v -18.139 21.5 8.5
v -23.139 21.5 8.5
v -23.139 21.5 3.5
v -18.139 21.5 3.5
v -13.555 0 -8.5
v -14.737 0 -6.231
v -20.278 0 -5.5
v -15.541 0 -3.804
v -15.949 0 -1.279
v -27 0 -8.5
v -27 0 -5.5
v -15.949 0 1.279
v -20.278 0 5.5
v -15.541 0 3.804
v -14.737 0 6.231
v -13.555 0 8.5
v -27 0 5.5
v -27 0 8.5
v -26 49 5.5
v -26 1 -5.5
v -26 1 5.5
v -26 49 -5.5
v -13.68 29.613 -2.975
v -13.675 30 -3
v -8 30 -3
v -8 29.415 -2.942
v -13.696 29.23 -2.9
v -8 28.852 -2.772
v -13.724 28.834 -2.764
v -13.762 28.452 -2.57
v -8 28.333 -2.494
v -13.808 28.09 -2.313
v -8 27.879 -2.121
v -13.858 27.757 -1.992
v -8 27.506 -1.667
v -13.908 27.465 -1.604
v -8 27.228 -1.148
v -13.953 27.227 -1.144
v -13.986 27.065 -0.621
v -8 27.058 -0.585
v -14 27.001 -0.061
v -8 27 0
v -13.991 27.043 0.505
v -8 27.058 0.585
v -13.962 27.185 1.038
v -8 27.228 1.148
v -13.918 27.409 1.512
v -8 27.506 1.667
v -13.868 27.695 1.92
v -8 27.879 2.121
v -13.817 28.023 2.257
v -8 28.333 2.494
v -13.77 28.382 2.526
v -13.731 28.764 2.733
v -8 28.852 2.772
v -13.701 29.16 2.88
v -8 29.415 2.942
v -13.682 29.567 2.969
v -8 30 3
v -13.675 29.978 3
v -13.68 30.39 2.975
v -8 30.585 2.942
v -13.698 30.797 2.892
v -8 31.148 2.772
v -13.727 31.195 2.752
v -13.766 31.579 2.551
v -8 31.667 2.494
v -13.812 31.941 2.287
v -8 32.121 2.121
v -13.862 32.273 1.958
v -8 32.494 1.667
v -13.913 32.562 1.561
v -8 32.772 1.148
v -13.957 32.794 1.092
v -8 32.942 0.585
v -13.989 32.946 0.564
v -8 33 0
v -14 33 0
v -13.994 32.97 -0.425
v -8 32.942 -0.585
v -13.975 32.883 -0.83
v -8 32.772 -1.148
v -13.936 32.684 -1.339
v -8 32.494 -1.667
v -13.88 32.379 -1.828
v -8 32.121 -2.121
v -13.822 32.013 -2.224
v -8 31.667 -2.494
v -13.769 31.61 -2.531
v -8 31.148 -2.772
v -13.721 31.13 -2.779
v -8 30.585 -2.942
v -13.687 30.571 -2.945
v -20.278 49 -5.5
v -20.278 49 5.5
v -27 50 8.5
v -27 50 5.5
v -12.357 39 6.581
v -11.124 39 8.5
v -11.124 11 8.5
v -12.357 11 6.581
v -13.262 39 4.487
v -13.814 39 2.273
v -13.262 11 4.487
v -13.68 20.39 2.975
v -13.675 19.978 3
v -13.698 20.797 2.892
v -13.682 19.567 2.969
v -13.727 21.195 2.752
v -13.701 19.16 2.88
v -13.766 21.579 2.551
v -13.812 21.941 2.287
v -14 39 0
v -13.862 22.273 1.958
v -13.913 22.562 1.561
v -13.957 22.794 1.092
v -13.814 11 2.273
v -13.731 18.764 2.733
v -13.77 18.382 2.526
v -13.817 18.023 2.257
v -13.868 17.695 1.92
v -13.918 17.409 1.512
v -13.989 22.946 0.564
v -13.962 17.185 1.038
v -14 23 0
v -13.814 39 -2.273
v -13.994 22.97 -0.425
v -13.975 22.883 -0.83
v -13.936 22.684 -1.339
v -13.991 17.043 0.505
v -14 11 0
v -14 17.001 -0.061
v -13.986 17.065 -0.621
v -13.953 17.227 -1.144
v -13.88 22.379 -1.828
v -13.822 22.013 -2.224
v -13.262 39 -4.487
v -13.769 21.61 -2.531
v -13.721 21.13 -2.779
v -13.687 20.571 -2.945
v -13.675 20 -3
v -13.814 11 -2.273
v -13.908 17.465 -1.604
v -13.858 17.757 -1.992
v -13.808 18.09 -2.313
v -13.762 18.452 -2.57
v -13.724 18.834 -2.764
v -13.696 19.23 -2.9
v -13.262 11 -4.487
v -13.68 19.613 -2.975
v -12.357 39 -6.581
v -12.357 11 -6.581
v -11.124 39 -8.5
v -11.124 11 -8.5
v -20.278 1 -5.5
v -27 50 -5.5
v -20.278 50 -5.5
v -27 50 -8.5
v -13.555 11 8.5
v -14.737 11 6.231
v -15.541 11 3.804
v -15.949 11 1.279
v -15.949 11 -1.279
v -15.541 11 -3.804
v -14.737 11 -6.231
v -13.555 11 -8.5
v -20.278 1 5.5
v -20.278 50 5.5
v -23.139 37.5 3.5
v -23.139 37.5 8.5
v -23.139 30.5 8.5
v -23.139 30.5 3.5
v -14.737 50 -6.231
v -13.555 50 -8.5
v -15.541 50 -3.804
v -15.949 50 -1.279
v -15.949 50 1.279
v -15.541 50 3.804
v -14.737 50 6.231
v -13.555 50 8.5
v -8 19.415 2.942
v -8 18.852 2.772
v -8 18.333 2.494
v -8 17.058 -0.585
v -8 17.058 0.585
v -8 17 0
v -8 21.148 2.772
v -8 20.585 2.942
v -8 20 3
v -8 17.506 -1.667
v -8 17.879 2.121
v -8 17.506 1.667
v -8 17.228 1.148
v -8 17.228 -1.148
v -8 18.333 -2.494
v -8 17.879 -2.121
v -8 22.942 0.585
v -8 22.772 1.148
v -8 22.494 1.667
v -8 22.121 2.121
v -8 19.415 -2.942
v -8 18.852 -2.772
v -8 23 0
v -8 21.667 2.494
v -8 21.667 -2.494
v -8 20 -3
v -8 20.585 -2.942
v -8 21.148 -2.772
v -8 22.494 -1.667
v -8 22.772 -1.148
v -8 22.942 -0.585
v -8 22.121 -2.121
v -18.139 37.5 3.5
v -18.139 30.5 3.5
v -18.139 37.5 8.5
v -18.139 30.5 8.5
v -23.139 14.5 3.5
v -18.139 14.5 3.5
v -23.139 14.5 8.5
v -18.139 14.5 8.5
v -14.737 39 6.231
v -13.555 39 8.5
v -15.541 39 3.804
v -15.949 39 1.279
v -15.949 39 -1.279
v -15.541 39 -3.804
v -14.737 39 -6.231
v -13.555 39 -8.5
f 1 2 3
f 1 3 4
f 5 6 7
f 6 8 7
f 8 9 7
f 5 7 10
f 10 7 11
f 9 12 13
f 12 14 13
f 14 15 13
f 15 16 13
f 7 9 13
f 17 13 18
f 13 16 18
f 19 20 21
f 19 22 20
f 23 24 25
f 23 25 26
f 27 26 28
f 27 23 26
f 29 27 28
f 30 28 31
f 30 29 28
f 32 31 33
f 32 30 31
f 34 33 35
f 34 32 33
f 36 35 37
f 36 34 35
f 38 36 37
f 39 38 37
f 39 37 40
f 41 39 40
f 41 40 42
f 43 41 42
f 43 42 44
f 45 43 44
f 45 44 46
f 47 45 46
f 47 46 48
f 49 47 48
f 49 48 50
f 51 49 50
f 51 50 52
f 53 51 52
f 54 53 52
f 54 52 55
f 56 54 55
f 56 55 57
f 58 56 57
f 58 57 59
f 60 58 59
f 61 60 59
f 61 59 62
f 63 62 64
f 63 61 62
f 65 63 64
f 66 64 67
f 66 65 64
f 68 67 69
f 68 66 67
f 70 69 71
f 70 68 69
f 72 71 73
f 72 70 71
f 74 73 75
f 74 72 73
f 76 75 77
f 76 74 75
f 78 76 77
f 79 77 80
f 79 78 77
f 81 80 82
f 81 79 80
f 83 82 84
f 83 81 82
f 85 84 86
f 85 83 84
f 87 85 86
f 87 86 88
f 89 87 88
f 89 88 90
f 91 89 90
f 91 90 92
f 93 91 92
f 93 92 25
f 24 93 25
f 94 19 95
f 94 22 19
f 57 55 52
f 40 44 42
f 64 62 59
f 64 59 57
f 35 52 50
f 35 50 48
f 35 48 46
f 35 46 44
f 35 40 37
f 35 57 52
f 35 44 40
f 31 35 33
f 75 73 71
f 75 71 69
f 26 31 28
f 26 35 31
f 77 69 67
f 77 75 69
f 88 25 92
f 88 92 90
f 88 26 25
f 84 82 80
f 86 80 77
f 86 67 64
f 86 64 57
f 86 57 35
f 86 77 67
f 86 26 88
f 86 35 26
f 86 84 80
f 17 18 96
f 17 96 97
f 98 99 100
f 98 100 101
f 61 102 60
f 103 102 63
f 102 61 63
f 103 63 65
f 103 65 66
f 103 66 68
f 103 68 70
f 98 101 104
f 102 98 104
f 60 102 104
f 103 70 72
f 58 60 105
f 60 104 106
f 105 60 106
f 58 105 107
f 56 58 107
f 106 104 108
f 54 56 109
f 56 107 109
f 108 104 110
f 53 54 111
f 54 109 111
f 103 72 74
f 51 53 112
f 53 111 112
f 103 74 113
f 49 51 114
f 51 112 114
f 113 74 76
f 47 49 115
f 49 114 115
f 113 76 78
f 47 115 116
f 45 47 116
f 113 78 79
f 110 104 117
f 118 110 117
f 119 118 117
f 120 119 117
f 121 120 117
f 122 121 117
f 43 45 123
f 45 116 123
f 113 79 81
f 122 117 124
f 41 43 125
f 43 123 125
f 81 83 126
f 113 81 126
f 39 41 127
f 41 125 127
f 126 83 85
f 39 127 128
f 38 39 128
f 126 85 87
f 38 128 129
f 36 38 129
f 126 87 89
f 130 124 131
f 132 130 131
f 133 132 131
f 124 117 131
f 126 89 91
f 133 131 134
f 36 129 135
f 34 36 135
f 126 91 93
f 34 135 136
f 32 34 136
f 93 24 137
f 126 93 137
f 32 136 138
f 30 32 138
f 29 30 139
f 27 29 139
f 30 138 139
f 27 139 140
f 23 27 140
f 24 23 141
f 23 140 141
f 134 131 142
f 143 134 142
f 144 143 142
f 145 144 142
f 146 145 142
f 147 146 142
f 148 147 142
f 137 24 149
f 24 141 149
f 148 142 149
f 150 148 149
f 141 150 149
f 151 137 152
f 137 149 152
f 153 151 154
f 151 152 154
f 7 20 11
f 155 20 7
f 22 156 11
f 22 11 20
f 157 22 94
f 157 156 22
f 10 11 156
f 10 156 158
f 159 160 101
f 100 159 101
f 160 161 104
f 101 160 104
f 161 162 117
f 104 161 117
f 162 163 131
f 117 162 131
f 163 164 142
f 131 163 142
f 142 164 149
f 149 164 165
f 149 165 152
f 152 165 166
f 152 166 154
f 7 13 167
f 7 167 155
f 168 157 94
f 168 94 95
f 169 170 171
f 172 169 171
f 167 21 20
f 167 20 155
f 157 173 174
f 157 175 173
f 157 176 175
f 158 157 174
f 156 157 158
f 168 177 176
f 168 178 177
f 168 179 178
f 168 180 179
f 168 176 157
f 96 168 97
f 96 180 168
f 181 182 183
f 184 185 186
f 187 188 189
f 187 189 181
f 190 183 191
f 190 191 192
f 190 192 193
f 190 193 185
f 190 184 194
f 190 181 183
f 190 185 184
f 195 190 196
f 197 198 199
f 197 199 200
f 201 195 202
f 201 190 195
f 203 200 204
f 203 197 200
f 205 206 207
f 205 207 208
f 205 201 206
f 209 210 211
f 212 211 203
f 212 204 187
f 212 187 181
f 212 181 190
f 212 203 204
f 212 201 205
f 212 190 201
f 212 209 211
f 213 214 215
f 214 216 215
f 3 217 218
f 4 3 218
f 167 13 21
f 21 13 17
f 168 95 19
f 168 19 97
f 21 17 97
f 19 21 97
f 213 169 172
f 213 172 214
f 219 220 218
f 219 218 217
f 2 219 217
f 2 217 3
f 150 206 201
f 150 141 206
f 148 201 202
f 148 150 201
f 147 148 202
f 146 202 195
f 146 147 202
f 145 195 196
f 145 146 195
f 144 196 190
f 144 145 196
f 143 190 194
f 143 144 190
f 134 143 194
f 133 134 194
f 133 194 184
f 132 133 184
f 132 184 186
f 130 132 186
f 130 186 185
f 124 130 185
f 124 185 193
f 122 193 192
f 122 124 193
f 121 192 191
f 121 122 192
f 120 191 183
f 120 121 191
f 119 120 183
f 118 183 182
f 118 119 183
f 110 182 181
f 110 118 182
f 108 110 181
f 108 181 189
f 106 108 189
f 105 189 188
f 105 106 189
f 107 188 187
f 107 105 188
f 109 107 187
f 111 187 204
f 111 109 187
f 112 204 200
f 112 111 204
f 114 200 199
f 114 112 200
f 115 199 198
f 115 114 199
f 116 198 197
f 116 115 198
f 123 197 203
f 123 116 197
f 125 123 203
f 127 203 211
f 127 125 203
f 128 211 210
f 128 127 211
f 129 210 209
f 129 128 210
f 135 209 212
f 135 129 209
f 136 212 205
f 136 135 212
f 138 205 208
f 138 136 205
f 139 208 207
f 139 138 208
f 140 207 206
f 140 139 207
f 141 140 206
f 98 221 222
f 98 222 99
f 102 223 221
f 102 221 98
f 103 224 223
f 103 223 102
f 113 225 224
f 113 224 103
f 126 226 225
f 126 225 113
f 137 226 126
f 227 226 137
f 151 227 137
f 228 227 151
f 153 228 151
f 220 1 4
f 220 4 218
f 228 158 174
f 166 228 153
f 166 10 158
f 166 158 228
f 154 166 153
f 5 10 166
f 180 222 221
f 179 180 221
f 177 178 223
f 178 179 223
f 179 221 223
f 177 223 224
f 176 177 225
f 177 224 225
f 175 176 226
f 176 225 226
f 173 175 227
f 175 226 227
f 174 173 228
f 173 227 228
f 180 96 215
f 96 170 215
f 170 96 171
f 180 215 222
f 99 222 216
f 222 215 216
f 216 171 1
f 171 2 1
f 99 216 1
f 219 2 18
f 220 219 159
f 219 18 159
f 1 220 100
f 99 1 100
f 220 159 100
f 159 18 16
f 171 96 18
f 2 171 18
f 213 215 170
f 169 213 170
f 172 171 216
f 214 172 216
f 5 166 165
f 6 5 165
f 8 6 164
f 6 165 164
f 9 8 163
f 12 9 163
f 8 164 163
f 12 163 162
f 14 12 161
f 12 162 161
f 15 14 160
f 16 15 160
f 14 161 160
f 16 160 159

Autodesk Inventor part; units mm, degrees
sketch "Sketch1" plane through (0, 0, 0) normal (0, 1, 0) x (-1, 0, 0)
  circle A0 centre (0, 0) radius 14
  line L0 (14, 0) -> (27, 0)
  circle A1 centre (0, 0) radius 16
  line L1 (27, 0) -> (27, -8.5)
  line L2 (27, -8.5) -> (13.5552, -8.5)
  line L3 (13.5552, 8.5) -> (27, 8.5)
  line L4 (27, 8.5) -> (27, -8.5)
  line L5 (13.5552, 8.5) -> (11.1243, 8.5)
  line L6 (13.5552, -8.5) -> (11.1243, -8.5)
  line L7 (13.5552, 8.5) -> (13.5552, -8.5)
  dimension "d0" = 28
  dimension "d1" = 13
  dimension "d2" = 32
  dimension "d3" = 8.5
  dimension "d5" = 17
extrude "Extrusion1" add sketch "Sketch1" along normal blind 50 contours L5 L7 A0 | A0 L7 L6 | L7 A1 L0 A0 | L3 L4 L0 A1 | A0 L0 A1 L7 | A1 L0 L1 L2
ref_plane "Work Plane1" through (0, 11, 0) normal (0, -1, 0) x (1, 0, 0)
sketch "Sketch2" plane through (0, 11, 0) normal (0, -1, 0) x (1, 0, 0)
  circle A0 centre (0, 0) radius 16
  line L0 (-11.1243, -8.5) -> (-27, -8.5) projected
  circle A1 centre (0, 0) radius 14
  line L1 (-27, 8.5) -> (-11.1243, 8.5) projected
  line L2 (-13.5554, 8.5) -> (-11.1243, 8.5)
  line L3 (-13.5554, -8.5) -> (-11.1243, -8.5)
  dimension "d9" = 32
extrude "Extrusion2" cut sketch "Sketch2" against normal blind 28 contours L1 A1 L0 A0 picked at (-13.7856, -6.5585)
ref_plane "Work Plane2" through (-13.5554, 11, 8.5) normal (-1, 0, 0) x (0, 1, 0)
sketch "Sketch3" plane through (-13.5554, 11, 8.5) normal (-1, 0, 0) x (0, 1, 0)
  line L0 (28, 17) -> (28, 0) construction
  line L1 (28, 8.5) -> (0, 8.5) construction
  line L2 (0, 17) -> (0, 0) construction
  line L3 (28, 8.5) -> (19, 8.5)
  circle A0 centre (19, 8.5) radius 3
  line L4 (0, 8.5) -> (9, 8.5)
  circle A1 centre (9, 8.5) radius 3
  point P0 (-11, 8.5)
  dimension "d14" = 9
  dimension "d15" = 6
  dimension "d17" = 9
  dimension "d18" = 6
extrude "Extrusion3" add sketch "Sketch3" along normal up to surface
sketch "Sketch4" plane through (-13.5554, 30, 0) normal (1, 0, 0) x (0, 0, -1)
  circle A0 centre (0, 0) radius 3 projected
  circle A1 centre (0, 0) radius 3
  point P0 (0, -30)
sketch "Sketch5" plane through (-13.5554, 20, 0) normal (1, 0, 0) x (0, 0, -1)
  circle A0 centre (0, 0) radius 3
  point P0 (0, -20)
extrude "Extrusion4" cut sketch "Sketch4" against normal blind 0.445
extrude "Extrusion5" cut sketch "Sketch5" against normal blind 0.445
sketch "Sketch6" plane through (-14.0004, 30, 0) normal (1, 0, 0) x (0, 0, -1)
  circle A0 centre (0, 0) radius 3
  point P0 (0, -30)
sketch "Sketch7" plane through (-14.0004, 20, 0) normal (1, 0, 0) x (0, 0, -1)
  circle A0 centre (0, 0) radius 3
  point P0 (0, -20)
extrude "Extrusion6" add sketch "Sketch6" along normal blind 6
extrude "Extrusion7" add sketch "Sketch7" along normal up to surface (6 mm away)
sketch "Sketch8" plane through (0, 11, 0) normal (0, 1, 0) x (1, 0, 0)
  circle A0 centre (0, 0) radius 14
  circle A1 centre (0, 0) radius 16
  line L0 (-13.5554, 8.5) -> (-11.1243, 8.5) projected
  line L1 (-13.5554, 8.5) -> (-11.1243, 8.5)
  arc A2 (-11.1243, 8.5) -> (-11.1243, -8.5) centre (0, 0) ccw projected
  line L2 (-13.5554, -8.5) -> (-11.1243, -8.5)
  dimension "d29" = 32
sketch "Sketch9" plane through (0, 11, 0) normal (0, 1, 0) x (1, 0, 0)
  circle A0 centre (0, 0) radius 16
  circle A1 centre (0, 0) radius 14
  dimension "d30" = 32
extrude "Extrusion8" add sketch "Sketch8" along normal up to surface (28 mm away) contours A0 L2 A1 L0 picked at (-13.7856, -6.5585)
extrude "Extrusion9" cut sketch "Sketch9" against normal up to surface (11 mm away)
ref_plane "Work Plane3" through (0, 39, 0) normal (0, 1, 0) x (1, 0, 0)
sketch "Sketch10" plane through (0, 39, 0) normal (0, 1, 0) x (1, 0, 0)
  circle A0 centre (0, 0) radius 16
  circle A1 centre (0, 0) radius 14
  dimension "d36" = 32
  dimension "d37" = 28
extrude "Extrusion10" cut sketch "Sketch10" along normal up to surface (11 mm away)
sketch "Sketch11" plane through (-27, 0, -8.5) normal (-1, 0, 0) x (0, 0, 1)
  line L0 (17, 0) -> (17, 50) projected
  line L1 (17, 50) -> (14, 50)
  line L2 (0, 50) -> (17, 50) projected
  line L3 (14, 50) -> (3, 50)
  line L4 (0, 0) -> (0, 50) projected
  line L5 (0, 0) -> (3, 0)
  line L6 (17, 0) -> (0, 0) projected
  line L7 (14, 50) -> (3, 50)
  line L8 (3, 50) -> (3, 0)
  line L9 (3, 0) -> (14, 0)
  line L10 (14, 0) -> (14, 50)
  point P0 (8.5, 0)
  dimension "d40" = 3
  dimension "d41" = 11
  dimension "d42" = 3
extrude "Extrusion11" cut sketch "Sketch11" against normal blind 1 contours L6 L8 L2 L10
sketch "Sketch12" plane through (0, 50, 0) normal (0, 1, 0) x (1, 0, 0)
  line L0 (-27, -5.5) -> (-27, -8.5) projected
  line L1 (-27, -5.5) -> (-20.278, -5.5)
  line L2 (-27, 5.5) -> (-26, 5.5) projected
  line L3 (-20.278, -5.5) -> (-27, -5.5)
  line L4 (-27, -5.5) -> (-27, 5.5)
  line L5 (-27, 5.5) -> (-20.278, 5.5)
  line L6 (-20.278, 5.5) -> (-20.278, -5.5)
  point P0 (0, 0)
  dimension "d45" = 6.722
sketch "Sketch13" plane through (0, 0, 0) normal (0, -1, 0) x (1, 0, 0)
  line L0 (-27, -5.5) -> (-26, -5.5) projected
  line L1 (-27, -5.5) -> (-20.278, -5.5)
  line L2 (-20.278, -5.5) -> (-27, -5.5)
  line L3 (-27, -5.5) -> (-27, 5.5)
  line L4 (-27, 5.5) -> (-20.278, 5.5)
  line L5 (-20.278, 5.5) -> (-20.278, -5.5)
  point P0 (0, 0)
  dimension "d46" = 6.722
extrude "Extrusion12" cut sketch "Sketch13" against normal blind 1
extrude "Extrusion13" cut sketch "Sketch12" against normal blind 1
sketch "Sketch14" plane through (-27, 0, 8.5) normal (0, 0, 1) x (1, 0, 0)
  line L0 (0, 50) -> (6.722, 50) construction
  line L1 (6.722, 50) -> (6.722, 41) construction
  line L2 (6.722, 41) -> (6.722, 34) construction
  line L3 (0, 34) -> (0, 31) construction
  line L4 (0, 31) -> (3.361, 31) construction
  line L5 (6.722, 34) -> (3.361, 34) construction
  line L6 (3.361, 34) -> (3.361, 31) construction
  line L7 (3.361, 31) -> (4.861, 31) construction
  line L8 (0, 0) -> (0, 50) construction
  line L9 (4.861, 31) -> (4.861, 38.2796) construction
  line L10 (4.861, 31) -> (7.861, 31) construction
  line L11 (13, 39) -> (13, 11) construction
  line L12 (6.361, 31) -> (6.361, 37.5) construction
  line L13 (4.861, 36.5) -> (7.861, 36.5) construction
  line L14 (7.861, 36.5) -> (7.861, 31.5) construction
  line L15 (7.861, 31.5) -> (4.861, 31.5) construction
  line L16 (4.861, 31.5) -> (4.861, 36.5) construction
  line L17 (4.861, 36.5) -> (7.861, 31.5) construction
  line L18 (7.861, 36.5) -> (4.861, 31.5) construction
  line L19 (6.361, 31.5) -> (6.361, 20.5) construction
  line L20 (6.361, 20.5) -> (6.361, 18) construction
  line L21 (4.861, 15.5) -> (7.861, 15.5) construction
  line L22 (7.861, 15.5) -> (7.861, 20.5) construction
  line L23 (7.861, 20.5) -> (4.861, 20.5) construction
  line L24 (4.861, 20.5) -> (4.861, 15.5) construction
  line L25 (4.861, 15.5) -> (7.861, 20.5) construction
  line L26 (7.861, 15.5) -> (4.861, 20.5) construction
  line L27 (8.861, 21.5) -> (8.861, 14.5)
  line L28 (8.861, 14.5) -> (3.861, 14.5)
  line L29 (3.861, 14.5) -> (3.861, 21.5)
  line L30 (3.861, 21.5) -> (8.861, 21.5)
  line L31 (8.861, 37.5) -> (3.861, 37.5)
  line L32 (3.861, 37.5) -> (3.861, 30.5)
  line L33 (3.861, 30.5) -> (8.861, 30.5)
  line L34 (8.861, 30.5) -> (8.861, 37.5)
  point P0 (27, 0)
  point P1 (6.361, 34)
  dimension "d51" = 9
  dimension "d52" = 7
  dimension "d53" = 3
  dimension "d54" = 1.5
  dimension "d55" = 3
  dimension "d56" = 3
  dimension "d57" = 5
  dimension "d58" = 11
  dimension "d59" = 2.5
  dimension "d60" = 1
  dimension "d61" = 1
extrude "Extrusion14" cut sketch "Sketch14" against normal blind 5
properties part number "Button"
